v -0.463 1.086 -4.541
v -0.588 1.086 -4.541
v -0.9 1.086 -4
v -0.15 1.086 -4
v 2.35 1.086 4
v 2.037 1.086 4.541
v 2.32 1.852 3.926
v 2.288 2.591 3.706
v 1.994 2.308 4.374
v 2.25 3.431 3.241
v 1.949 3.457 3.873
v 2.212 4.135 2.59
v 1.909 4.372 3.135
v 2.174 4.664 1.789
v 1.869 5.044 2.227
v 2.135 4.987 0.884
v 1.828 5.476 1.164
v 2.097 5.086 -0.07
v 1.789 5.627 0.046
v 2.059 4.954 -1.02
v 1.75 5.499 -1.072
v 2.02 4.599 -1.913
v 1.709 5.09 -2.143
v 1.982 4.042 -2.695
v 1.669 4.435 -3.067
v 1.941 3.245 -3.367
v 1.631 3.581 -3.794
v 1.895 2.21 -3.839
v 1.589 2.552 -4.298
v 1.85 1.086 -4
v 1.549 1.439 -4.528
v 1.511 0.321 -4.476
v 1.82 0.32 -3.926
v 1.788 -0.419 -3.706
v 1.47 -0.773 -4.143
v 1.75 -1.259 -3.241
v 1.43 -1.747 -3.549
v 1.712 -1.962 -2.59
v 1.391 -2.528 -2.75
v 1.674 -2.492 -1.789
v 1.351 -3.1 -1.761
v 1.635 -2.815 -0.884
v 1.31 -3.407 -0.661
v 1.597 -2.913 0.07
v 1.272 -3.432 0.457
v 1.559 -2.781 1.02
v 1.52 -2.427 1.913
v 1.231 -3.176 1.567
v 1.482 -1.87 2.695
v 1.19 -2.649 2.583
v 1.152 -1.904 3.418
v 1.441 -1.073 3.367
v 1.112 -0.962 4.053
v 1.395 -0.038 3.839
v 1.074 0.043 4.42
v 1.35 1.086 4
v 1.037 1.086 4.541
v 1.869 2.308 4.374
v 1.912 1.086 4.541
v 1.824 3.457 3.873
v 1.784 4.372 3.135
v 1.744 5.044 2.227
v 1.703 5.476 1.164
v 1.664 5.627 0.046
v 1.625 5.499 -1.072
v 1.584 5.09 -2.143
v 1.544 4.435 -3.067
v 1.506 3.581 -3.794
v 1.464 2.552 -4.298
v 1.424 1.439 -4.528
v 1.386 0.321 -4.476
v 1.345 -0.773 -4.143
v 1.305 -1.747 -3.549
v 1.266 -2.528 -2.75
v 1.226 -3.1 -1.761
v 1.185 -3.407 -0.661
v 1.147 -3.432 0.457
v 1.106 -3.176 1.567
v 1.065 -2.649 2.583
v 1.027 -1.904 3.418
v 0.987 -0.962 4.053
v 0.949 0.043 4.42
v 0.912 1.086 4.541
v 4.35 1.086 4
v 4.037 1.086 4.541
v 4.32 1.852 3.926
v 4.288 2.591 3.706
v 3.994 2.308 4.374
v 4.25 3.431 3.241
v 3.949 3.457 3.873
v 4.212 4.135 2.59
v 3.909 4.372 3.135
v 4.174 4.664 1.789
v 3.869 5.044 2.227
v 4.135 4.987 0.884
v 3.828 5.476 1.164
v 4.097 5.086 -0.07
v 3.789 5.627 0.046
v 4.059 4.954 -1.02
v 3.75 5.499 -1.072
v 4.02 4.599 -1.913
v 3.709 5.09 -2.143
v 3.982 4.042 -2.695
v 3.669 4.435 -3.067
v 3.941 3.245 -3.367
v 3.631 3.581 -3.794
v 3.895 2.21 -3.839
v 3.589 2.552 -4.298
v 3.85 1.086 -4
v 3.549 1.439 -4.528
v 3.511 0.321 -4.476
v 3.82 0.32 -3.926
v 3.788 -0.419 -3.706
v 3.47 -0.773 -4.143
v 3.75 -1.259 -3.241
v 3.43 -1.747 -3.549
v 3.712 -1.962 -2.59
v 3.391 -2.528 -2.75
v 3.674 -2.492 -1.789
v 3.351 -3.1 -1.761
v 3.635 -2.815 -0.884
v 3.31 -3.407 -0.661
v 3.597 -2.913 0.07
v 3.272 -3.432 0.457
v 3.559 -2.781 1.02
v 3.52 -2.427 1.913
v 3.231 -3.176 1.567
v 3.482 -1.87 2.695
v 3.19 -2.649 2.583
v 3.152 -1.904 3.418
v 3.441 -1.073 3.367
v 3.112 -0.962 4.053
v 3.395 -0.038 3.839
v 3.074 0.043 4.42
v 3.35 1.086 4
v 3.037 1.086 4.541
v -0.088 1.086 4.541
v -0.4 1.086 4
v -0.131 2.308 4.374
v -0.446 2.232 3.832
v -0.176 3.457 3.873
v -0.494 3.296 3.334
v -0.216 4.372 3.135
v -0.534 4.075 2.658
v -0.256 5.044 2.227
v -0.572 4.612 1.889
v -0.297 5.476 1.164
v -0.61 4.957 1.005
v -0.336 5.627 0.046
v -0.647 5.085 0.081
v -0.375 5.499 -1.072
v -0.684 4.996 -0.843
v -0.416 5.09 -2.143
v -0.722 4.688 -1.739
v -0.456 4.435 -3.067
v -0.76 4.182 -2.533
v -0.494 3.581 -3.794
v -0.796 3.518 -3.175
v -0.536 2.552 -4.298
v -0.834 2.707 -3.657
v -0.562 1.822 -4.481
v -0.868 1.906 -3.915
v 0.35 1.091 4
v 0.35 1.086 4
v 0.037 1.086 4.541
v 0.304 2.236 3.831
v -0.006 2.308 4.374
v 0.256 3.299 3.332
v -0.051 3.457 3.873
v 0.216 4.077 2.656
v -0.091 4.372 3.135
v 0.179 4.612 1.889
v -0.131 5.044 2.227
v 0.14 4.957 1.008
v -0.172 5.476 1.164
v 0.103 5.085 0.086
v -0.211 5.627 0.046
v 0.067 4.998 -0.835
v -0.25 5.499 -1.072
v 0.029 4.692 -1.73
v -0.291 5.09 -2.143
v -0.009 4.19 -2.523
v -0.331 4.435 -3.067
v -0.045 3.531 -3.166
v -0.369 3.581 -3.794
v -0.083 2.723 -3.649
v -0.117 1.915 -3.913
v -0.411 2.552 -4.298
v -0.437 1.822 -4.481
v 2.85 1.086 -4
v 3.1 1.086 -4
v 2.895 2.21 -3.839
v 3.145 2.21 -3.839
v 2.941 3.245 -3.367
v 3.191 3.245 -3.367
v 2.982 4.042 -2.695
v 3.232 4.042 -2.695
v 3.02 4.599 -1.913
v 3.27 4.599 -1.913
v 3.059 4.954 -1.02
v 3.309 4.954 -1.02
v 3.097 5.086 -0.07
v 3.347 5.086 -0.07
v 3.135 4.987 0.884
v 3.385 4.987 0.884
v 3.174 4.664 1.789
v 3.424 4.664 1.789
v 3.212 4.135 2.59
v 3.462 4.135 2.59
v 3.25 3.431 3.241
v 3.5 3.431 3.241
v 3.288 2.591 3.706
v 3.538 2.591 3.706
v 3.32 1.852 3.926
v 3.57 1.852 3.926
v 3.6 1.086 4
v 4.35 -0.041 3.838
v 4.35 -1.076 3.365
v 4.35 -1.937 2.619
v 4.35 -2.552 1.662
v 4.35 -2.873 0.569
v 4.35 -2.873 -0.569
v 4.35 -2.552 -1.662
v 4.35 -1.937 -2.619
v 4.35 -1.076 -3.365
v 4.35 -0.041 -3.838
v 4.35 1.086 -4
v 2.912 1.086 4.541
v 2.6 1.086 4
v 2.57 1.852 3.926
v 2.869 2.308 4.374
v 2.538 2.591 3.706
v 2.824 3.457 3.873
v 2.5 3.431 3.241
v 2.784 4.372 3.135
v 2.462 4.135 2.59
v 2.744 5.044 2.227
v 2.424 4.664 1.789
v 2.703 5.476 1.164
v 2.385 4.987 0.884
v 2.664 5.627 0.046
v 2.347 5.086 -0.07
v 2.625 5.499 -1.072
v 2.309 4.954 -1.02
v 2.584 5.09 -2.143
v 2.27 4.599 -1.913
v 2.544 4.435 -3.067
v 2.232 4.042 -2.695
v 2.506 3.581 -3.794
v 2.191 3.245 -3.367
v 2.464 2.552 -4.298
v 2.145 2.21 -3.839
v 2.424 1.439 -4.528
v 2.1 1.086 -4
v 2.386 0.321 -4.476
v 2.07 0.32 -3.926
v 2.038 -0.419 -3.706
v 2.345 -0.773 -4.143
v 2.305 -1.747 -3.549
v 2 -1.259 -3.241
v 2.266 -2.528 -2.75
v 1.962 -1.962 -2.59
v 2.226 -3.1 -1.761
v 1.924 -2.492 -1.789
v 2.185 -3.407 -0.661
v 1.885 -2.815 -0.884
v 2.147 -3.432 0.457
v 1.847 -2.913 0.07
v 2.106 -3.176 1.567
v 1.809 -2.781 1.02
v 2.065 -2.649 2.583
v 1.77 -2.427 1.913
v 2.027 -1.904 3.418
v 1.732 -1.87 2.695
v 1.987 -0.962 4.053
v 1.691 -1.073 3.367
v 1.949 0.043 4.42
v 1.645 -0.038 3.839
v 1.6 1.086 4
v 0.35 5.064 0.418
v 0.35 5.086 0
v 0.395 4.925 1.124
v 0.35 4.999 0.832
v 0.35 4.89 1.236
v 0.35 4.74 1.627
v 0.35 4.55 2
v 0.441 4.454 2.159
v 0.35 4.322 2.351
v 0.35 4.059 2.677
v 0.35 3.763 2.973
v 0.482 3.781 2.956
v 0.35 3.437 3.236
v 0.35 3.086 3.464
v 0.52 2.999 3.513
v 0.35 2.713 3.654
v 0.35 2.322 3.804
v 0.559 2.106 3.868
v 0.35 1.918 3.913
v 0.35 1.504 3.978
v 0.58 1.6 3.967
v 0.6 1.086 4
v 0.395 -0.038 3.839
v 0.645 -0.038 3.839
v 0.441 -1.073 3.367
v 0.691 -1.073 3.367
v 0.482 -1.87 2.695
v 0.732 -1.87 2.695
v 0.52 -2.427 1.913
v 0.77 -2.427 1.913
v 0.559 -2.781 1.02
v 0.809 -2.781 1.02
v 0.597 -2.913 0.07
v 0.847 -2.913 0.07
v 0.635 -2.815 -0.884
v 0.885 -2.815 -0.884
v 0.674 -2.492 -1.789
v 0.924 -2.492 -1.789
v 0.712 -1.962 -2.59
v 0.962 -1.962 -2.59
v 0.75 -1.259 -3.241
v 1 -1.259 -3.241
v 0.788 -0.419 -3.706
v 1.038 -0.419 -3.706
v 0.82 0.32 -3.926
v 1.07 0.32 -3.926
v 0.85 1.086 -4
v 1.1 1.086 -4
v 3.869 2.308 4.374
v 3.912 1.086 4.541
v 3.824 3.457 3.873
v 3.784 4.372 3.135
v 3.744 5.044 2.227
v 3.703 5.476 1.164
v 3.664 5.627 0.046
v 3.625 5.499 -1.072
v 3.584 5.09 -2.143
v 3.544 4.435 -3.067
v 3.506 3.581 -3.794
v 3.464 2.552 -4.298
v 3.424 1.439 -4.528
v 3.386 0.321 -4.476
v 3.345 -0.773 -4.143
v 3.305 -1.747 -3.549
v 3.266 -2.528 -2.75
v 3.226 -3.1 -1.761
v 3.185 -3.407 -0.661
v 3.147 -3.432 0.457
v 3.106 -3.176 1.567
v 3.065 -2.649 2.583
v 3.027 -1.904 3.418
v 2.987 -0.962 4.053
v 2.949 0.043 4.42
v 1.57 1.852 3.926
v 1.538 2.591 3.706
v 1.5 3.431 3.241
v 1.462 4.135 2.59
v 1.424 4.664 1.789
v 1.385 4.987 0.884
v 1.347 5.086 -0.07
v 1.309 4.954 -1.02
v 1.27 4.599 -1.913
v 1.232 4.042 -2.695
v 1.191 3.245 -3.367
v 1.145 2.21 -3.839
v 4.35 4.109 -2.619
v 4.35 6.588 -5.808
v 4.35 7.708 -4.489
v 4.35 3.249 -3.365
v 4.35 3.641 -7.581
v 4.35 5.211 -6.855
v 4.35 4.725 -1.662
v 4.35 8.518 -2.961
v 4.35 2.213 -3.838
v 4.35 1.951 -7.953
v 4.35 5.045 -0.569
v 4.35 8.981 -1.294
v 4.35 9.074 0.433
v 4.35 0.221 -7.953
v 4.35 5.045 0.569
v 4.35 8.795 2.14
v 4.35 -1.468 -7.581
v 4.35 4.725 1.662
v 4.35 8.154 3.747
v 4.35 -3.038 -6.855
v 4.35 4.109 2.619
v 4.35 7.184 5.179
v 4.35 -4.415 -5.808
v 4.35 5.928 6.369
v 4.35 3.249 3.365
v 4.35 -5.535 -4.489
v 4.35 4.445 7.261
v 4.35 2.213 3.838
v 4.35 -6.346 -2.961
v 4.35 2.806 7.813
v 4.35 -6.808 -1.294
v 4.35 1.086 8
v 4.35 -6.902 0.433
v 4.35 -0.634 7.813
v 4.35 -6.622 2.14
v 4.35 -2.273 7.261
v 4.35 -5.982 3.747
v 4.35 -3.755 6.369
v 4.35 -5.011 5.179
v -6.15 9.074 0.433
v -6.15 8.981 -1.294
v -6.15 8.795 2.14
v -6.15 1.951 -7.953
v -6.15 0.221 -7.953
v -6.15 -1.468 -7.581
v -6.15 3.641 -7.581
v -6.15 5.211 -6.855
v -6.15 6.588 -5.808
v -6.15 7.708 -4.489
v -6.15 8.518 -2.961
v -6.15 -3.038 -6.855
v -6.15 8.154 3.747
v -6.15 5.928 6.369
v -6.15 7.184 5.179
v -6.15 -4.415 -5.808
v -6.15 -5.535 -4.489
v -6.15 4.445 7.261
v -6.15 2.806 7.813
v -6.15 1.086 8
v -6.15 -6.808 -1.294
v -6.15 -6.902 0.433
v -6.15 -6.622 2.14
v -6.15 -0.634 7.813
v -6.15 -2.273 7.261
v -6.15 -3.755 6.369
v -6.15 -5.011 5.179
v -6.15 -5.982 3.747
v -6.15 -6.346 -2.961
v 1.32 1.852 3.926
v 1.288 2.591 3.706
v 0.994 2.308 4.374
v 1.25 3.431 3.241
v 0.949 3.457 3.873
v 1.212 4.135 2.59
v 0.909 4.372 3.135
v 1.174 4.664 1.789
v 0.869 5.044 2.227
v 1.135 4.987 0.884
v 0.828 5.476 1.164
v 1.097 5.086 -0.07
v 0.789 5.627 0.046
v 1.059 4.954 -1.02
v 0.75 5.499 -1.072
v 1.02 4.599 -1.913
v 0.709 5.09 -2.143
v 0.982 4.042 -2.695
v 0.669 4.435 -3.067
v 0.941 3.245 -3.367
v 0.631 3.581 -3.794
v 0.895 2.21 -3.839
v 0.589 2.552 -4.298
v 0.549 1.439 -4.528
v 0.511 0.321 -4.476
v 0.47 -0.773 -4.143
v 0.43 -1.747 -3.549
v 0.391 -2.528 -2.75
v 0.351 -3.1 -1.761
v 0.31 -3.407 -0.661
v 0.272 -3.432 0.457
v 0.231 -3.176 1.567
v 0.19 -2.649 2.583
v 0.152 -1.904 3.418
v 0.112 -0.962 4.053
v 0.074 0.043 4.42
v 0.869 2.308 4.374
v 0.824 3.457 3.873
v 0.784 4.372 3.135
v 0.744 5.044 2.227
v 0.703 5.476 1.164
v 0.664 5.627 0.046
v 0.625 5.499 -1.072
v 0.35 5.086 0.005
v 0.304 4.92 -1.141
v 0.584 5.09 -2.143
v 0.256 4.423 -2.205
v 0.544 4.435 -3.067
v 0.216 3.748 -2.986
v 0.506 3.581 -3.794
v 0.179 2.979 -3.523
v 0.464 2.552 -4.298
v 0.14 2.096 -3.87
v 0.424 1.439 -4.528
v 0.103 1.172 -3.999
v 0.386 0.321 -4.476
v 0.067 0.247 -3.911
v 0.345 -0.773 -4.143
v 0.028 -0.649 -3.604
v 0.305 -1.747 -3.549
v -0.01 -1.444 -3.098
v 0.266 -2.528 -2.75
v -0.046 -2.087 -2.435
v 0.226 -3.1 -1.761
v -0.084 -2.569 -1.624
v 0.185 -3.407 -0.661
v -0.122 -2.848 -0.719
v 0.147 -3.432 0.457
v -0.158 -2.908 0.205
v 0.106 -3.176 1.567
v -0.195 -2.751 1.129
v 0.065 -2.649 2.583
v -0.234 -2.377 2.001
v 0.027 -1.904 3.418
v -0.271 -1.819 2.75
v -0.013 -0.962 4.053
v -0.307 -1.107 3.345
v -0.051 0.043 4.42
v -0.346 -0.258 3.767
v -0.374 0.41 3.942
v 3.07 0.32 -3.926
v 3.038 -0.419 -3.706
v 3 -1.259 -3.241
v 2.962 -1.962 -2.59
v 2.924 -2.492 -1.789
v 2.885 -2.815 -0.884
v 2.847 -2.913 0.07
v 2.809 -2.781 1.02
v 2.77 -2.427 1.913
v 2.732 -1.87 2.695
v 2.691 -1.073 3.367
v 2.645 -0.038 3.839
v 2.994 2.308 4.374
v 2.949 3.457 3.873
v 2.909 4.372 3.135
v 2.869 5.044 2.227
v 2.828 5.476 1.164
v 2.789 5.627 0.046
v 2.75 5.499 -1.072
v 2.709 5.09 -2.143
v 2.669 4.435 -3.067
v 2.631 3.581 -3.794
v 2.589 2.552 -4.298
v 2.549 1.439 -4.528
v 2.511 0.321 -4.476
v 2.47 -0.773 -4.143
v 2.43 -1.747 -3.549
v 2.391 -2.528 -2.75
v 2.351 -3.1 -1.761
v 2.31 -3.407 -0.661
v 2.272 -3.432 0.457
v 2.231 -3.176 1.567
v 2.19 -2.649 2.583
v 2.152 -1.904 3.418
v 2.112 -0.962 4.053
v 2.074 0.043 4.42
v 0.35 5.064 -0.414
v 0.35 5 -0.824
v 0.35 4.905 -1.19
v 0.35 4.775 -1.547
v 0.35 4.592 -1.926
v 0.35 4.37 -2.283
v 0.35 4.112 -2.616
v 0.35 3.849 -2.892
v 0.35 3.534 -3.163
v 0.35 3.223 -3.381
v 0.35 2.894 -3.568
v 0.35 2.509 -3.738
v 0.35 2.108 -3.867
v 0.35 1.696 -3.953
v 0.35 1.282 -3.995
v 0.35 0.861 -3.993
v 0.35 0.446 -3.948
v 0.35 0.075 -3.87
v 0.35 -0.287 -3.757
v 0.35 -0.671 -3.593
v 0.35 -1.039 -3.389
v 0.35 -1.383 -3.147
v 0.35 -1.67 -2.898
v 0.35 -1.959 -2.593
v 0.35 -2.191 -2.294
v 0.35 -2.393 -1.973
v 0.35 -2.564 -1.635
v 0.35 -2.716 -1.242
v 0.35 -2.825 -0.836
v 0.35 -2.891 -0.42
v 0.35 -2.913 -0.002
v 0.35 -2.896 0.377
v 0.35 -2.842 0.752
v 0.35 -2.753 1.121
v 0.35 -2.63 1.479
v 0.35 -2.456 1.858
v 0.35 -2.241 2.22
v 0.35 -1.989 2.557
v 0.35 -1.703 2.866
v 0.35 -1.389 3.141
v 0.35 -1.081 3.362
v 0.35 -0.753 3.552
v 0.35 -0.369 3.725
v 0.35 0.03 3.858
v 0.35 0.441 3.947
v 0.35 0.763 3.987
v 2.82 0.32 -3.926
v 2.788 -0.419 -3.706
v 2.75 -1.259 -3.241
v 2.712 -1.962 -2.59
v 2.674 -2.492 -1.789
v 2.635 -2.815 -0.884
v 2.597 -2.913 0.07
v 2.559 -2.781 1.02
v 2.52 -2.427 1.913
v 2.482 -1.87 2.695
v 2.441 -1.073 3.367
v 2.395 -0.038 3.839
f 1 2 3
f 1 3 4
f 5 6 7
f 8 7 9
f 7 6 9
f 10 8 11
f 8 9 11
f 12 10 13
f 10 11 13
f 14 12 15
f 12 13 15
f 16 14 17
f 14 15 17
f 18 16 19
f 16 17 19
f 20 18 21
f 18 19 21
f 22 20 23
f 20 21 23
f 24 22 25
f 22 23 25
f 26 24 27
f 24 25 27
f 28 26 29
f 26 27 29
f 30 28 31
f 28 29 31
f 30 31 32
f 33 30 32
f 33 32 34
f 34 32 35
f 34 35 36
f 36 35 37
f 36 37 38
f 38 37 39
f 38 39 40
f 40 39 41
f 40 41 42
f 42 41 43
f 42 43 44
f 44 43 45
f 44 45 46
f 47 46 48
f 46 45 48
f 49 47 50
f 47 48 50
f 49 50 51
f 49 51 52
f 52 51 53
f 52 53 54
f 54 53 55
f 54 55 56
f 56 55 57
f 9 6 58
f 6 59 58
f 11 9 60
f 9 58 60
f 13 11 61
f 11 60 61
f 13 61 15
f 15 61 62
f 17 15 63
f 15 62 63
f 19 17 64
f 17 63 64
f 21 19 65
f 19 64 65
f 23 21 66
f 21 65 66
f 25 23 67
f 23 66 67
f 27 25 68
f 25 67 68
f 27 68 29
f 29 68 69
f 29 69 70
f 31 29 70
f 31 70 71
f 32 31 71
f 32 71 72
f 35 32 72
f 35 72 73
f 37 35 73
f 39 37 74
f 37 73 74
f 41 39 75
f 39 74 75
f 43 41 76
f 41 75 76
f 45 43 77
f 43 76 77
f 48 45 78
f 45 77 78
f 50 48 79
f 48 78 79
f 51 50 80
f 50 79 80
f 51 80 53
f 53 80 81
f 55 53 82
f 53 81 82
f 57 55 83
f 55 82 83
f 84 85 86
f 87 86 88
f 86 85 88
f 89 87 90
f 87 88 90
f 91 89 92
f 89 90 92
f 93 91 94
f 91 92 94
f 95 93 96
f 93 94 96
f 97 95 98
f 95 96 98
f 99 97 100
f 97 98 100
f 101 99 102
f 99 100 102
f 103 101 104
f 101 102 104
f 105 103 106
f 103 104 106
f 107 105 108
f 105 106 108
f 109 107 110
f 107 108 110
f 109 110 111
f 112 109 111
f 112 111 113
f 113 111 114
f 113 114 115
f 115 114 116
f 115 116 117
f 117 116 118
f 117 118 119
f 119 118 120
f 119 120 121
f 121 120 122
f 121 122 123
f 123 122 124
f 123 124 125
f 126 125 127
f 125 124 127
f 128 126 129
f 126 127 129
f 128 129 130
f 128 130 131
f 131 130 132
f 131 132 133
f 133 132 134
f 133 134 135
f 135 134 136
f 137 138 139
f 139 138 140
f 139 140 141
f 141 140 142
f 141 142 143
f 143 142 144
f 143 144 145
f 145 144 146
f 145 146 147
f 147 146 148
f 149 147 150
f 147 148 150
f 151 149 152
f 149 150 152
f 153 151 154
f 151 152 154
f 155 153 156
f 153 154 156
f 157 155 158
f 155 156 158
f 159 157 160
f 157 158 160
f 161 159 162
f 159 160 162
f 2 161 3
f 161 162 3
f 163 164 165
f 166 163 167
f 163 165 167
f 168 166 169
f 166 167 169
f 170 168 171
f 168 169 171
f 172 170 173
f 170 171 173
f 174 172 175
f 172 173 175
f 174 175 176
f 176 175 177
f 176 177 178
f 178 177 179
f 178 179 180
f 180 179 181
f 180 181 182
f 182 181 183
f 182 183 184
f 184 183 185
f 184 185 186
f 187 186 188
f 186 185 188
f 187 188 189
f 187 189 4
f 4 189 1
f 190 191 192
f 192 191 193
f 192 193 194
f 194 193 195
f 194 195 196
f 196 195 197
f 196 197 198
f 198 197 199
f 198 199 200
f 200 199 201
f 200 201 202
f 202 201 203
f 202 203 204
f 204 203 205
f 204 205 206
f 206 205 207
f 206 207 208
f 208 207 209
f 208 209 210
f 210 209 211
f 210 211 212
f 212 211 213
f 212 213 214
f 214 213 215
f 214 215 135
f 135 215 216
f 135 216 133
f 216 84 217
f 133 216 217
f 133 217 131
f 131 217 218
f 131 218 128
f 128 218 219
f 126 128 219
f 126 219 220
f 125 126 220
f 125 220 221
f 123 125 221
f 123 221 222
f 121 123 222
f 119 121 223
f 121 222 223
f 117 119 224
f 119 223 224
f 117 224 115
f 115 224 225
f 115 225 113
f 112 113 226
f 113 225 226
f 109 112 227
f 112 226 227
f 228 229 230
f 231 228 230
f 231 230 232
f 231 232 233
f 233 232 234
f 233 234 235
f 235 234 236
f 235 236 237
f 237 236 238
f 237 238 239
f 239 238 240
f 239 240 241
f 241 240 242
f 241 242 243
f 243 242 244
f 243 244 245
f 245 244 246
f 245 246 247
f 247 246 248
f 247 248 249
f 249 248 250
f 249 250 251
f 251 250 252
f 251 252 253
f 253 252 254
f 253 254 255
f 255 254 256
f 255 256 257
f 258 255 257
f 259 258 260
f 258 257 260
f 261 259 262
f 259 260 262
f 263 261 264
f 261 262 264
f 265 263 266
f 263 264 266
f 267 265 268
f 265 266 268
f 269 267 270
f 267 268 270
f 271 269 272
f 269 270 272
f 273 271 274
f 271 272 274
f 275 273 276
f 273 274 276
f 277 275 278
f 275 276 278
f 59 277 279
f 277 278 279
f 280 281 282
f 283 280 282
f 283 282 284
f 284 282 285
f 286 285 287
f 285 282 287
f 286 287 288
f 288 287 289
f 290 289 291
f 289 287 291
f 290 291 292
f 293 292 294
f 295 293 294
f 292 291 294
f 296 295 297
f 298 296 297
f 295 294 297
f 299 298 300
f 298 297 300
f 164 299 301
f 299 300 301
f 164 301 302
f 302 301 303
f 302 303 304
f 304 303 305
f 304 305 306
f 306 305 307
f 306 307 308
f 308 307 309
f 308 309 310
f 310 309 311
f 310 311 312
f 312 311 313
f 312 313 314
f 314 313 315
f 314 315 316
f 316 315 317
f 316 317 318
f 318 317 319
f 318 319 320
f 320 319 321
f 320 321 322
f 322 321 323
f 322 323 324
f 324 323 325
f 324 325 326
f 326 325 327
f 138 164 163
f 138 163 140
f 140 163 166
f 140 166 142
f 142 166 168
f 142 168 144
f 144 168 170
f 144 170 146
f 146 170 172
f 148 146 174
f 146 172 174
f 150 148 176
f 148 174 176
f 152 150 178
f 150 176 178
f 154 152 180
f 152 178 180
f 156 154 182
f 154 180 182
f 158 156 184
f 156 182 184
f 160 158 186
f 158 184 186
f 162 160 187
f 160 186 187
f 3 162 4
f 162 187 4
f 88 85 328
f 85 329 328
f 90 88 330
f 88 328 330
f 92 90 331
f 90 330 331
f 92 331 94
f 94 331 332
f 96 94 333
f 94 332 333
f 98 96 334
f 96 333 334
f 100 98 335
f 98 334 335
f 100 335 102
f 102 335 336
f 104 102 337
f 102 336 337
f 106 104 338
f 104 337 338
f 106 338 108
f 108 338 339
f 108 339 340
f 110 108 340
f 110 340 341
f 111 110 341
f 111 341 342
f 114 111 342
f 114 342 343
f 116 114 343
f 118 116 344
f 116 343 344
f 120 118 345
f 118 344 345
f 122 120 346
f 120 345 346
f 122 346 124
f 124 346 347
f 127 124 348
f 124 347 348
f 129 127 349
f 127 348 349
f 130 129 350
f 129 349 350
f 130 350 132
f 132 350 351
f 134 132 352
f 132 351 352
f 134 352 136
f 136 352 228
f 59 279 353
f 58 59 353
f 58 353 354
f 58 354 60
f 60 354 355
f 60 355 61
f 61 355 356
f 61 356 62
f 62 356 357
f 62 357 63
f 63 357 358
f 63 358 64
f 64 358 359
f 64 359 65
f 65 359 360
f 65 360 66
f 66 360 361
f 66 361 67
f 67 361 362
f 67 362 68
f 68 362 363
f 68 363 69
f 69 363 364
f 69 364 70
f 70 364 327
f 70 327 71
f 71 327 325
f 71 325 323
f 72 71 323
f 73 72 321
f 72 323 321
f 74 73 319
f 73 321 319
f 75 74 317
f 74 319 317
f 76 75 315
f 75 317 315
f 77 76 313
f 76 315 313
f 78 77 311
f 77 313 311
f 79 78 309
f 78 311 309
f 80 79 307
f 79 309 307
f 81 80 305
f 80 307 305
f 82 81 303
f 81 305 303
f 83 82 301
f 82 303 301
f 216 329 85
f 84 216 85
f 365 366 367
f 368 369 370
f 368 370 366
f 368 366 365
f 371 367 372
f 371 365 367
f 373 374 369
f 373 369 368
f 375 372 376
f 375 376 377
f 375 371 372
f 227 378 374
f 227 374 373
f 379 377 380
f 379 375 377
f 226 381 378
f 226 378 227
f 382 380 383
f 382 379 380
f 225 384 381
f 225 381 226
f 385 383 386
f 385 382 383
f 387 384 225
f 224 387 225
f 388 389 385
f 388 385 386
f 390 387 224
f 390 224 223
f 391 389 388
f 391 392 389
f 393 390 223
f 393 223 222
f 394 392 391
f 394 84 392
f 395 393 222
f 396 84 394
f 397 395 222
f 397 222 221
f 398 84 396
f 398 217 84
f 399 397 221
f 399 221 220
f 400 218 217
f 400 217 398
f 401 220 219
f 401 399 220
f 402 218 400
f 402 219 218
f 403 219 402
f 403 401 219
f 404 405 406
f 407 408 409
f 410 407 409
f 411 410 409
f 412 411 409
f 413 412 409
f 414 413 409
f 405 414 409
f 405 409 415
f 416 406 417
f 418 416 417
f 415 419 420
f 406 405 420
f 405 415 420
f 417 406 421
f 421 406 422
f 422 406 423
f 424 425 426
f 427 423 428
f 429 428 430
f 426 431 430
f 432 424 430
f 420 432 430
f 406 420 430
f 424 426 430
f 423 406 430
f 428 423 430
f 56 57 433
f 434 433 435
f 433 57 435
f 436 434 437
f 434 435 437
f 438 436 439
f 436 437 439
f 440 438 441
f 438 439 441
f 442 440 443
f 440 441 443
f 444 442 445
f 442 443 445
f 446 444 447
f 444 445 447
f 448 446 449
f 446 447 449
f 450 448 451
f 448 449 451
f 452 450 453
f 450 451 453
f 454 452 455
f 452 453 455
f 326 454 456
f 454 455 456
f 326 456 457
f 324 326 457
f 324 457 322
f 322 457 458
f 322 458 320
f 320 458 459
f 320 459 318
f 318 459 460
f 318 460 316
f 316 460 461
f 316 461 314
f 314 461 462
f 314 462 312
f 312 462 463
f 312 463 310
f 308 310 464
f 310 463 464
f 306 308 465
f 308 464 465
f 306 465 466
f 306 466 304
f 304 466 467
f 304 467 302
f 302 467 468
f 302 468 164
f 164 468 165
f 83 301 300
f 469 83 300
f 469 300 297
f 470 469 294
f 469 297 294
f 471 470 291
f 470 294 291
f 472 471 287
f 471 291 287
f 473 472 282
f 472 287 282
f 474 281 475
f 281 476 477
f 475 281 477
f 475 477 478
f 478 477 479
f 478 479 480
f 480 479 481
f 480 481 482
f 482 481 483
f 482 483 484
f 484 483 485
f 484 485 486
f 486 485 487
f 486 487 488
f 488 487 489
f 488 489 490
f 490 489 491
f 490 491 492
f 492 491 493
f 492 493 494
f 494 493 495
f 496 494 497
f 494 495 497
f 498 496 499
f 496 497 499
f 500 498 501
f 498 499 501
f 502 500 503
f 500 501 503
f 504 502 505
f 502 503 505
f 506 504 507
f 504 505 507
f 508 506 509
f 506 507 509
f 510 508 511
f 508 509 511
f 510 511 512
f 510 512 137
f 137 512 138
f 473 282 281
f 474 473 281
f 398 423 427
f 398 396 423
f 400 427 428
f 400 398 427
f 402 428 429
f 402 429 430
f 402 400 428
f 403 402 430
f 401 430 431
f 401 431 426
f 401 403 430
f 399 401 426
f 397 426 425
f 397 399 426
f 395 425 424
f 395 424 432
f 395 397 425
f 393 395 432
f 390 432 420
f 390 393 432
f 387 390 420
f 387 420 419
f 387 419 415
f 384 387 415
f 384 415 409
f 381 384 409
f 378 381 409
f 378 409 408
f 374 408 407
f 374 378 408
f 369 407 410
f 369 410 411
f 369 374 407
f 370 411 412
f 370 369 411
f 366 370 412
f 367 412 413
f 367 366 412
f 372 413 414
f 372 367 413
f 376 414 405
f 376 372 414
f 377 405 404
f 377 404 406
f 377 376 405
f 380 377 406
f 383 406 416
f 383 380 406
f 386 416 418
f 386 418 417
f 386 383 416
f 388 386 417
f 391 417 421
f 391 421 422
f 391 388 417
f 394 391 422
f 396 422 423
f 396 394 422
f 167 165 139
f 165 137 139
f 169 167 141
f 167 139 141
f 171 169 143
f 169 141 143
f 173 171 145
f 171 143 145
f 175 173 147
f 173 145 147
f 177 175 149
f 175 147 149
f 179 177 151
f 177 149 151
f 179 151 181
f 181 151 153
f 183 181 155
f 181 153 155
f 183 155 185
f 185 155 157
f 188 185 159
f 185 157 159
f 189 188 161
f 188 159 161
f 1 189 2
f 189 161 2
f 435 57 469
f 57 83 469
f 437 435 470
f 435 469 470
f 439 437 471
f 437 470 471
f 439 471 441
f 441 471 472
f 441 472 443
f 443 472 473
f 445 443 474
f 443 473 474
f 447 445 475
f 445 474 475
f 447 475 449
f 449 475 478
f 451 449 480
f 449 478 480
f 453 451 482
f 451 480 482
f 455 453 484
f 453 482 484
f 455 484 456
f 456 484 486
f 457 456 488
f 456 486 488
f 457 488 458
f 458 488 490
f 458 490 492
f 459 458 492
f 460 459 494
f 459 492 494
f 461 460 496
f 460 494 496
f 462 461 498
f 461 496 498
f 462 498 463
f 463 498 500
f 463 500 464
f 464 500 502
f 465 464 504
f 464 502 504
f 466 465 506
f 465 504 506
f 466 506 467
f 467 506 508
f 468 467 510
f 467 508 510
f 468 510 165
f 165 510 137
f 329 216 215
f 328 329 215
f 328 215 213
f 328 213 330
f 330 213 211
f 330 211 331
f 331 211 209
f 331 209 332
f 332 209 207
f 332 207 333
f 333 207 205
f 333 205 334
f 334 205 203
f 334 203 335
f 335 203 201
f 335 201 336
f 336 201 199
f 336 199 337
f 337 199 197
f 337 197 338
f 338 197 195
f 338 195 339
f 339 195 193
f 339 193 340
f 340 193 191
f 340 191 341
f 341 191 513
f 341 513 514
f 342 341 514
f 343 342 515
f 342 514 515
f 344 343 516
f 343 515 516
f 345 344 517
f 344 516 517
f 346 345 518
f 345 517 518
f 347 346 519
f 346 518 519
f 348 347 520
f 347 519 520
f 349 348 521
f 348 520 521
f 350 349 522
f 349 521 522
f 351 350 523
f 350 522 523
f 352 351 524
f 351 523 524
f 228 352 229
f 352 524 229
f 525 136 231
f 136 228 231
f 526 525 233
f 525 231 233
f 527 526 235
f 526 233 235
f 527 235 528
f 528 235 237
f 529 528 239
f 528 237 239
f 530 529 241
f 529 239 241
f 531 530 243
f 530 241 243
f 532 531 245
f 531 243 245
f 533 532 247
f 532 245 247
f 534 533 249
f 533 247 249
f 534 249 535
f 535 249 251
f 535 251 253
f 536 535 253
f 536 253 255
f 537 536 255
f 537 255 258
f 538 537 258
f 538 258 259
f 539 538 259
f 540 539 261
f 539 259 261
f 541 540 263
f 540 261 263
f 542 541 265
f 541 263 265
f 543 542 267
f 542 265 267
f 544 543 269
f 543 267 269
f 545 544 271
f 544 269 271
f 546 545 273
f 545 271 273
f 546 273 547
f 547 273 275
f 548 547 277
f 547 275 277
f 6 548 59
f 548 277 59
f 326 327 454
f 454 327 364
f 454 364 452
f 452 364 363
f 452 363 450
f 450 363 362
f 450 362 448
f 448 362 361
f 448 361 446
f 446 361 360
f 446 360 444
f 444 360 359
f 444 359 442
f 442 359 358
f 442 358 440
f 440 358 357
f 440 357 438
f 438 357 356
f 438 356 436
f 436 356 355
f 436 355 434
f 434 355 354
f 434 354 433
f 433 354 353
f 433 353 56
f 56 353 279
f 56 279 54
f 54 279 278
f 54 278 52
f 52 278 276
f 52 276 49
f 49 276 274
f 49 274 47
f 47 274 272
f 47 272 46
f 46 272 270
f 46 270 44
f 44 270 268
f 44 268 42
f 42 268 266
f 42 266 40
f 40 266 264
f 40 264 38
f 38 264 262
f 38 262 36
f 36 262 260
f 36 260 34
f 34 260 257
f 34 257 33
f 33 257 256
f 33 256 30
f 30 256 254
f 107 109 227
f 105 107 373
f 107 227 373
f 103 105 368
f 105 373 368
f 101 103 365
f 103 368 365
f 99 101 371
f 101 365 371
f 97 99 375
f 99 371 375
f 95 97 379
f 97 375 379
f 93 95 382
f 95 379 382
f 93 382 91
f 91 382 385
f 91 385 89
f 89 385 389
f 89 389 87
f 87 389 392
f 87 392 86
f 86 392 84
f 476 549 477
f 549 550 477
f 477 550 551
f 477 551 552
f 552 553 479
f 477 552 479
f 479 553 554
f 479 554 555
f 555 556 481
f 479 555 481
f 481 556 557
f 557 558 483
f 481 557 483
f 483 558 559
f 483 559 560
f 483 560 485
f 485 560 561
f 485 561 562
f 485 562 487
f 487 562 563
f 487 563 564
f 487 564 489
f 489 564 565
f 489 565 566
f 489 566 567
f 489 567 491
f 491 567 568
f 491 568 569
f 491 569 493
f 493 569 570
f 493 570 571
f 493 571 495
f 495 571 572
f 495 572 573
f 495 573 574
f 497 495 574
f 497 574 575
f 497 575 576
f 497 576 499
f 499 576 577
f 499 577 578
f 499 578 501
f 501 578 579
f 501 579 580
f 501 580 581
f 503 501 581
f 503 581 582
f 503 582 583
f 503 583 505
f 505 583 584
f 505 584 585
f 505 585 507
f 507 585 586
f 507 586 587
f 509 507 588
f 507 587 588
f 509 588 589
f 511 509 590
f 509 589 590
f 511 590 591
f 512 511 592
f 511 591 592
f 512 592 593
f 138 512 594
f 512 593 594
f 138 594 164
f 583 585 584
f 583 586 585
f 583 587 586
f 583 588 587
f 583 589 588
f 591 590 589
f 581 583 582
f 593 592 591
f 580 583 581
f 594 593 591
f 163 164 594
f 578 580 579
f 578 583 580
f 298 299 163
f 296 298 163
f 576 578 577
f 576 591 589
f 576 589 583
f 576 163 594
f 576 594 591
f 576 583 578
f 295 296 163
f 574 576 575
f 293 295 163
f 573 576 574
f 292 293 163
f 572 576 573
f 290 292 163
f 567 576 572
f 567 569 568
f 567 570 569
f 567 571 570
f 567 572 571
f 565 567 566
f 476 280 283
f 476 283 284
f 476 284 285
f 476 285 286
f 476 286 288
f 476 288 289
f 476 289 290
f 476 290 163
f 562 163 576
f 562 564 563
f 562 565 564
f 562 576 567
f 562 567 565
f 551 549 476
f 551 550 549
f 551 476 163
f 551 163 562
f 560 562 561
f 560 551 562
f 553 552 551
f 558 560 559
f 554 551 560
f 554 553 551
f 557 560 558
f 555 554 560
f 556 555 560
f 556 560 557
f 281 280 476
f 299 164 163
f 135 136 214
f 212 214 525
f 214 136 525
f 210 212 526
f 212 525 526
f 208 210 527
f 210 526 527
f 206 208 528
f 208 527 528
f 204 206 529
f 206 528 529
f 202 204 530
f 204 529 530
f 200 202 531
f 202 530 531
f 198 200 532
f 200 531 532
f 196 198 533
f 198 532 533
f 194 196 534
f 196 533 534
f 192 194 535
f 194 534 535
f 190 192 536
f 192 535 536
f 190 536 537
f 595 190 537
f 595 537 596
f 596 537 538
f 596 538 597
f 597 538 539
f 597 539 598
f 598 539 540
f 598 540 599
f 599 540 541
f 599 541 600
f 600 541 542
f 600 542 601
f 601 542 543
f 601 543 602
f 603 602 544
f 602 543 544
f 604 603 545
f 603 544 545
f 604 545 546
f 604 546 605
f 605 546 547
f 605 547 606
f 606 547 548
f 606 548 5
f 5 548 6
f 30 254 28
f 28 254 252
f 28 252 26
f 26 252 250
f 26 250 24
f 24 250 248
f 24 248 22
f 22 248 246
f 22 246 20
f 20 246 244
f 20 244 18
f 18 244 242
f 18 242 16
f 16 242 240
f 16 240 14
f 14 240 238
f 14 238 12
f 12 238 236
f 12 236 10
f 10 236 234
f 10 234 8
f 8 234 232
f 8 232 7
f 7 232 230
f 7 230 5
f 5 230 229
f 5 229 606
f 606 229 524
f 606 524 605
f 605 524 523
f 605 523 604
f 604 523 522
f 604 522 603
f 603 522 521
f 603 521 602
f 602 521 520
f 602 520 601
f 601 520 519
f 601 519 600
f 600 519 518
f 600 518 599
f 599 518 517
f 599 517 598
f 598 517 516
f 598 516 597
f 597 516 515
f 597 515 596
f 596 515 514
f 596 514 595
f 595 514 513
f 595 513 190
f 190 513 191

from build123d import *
from build123d.topology import SkipClean

# Parameters (mm, degrees)
IZIM1_W               = 10.5
IZIM1_H               = 8
IZIM3_R               = 4
KES_EKSTR_ZYON1_DEPTH = 4
DI_1_PITCH            = 1


with BuildPart() as part:
    # Çizim1 → Döndür1 (revolve)
    with BuildSketch(Plane.XY, mode=Mode.PRIVATE) as d_nd_r1_sk:
        with Locations((-0.900163094, -2.913793103)):
            Rectangle(IZIM1_W, IZIM1_H)
    revolve(d_nd_r1_sk.sketch.rotate(Axis((-6.150163094, 1.086206897, 0), (1, 0, 0)), 270), axis=Axis((-6.150163094, 1.086206897, 0), (1, 0, 0)))

    # Çizim3 → Kes-Ekstrüzyon1 (cut)
    with BuildSketch(Plane(origin=(4.349836906, 0, 0), x_dir=(0, 0, -1), z_dir=(1, 0, 0))):
        with Locations((0, 1.086206897)):
            Circle(IZIM3_R)
    extrude(amount=-KES_EKSTR_ZYON1_DEPTH, mode=Mode.SUBTRACT)

    # Diş1: the profile of Diş Profili1 profile screwed along a right-hand helix of 4.5 turns, 8 arcs to a turn; built about Z, then put on its axis
    with SkipClean():  # the faces are left unmerged after this step: merging them gives an invalid solid
        di_1_z = Axis((0, 0, 0), (0, 0, 1))
        di_1_corners = [(3.9997, 0, -0.000173205), (4.541265875, 0, 0.312499999), (4.541265875, 0, 0.437499999), (3.9997, 0, 0.750173202)]
        with BuildLine(mode=Mode.PRIVATE) as di_1_profile:
            Line(di_1_corners[0], di_1_corners[1])
            Line(di_1_corners[1], di_1_corners[2])
            Line(di_1_corners[2], di_1_corners[3])
            Line(di_1_corners[3], di_1_corners[0])
        di_1_cap = Face(di_1_profile.wire())
        di_1_turn_angles = [0, 22.5, 45, 67.5, 90, 112.5, 135, 157.5, 180, 202.5, 225, 247.5, 270, 292.5, 315, 337.5, 360]
        di_1_turn_weights = [1, 0.9238795325112867, 1, 0.9238795325112867, 1, 0.9238795325112867, 1, 0.9238795325112867, 1, 0.9238795325112867, 1, 0.9238795325112867, 1, 0.9238795325112867, 1, 0.9238795325112867, 1]
        di_1_turn_rails = [Edge.make_bspline([Vector(p[0], p[1], 0).rotate(di_1_z, di_1_turn_angles[k]) / di_1_turn_weights[k] + Vector(0, 0, p[2] + DI_1_PITCH * di_1_turn_angles[k] / 360) for k in range(17)], [0, 0, 0, 1, 1, 2, 2, 3, 3, 4, 4, 5, 5, 6, 6, 7, 7, 8, 8, 8], 2, di_1_turn_weights) for p in di_1_corners]
        di_1_turn_sides = [Face.make_surface_from_curves(di_1_turn_rails[p[0]], di_1_turn_rails[p[1]]) for p in [(0, 1), (1, 2), (2, 3), (3, 0)]]
        di_1_last_angles = [1440, 1462.5, 1485, 1507.5, 1530, 1552.5, 1575, 1597.5, 1620]
        di_1_last_weights = [1, 0.9238795325112867, 1, 0.9238795325112867, 1, 0.9238795325112867, 1, 0.9238795325112867, 1]
        di_1_last_rails = [Edge.make_bspline([Vector(p[0], p[1], 0).rotate(di_1_z, di_1_last_angles[k]) / di_1_last_weights[k] + Vector(0, 0, p[2] + DI_1_PITCH * di_1_last_angles[k] / 360) for k in range(9)], [0, 0, 0, 1, 1, 2, 2, 3, 3, 4, 4, 4], 2, di_1_last_weights) for p in di_1_corners]
        di_1_last_sides = [Face.make_surface_from_curves(di_1_last_rails[p[0]], di_1_last_rails[p[1]]) for p in [(0, 1), (1, 2), (2, 3), (3, 0)]]
        di_1 = Plane(origin=(4.349836906, 1.086206897, 0), x_dir=(0, 0, 1), z_dir=(-1, 0, 0)) * Solid(Shell([*[p.moved(Location((0, 0, DI_1_PITCH * i))) for i in range(4) for p in di_1_turn_sides], *di_1_last_sides, di_1_cap, di_1_cap.rotate(di_1_z, 1620).moved(Location((0, 0, DI_1_PITCH * 1620 / 360)))]))
        add(di_1, mode=Mode.SUBTRACT)


solid = part.part
